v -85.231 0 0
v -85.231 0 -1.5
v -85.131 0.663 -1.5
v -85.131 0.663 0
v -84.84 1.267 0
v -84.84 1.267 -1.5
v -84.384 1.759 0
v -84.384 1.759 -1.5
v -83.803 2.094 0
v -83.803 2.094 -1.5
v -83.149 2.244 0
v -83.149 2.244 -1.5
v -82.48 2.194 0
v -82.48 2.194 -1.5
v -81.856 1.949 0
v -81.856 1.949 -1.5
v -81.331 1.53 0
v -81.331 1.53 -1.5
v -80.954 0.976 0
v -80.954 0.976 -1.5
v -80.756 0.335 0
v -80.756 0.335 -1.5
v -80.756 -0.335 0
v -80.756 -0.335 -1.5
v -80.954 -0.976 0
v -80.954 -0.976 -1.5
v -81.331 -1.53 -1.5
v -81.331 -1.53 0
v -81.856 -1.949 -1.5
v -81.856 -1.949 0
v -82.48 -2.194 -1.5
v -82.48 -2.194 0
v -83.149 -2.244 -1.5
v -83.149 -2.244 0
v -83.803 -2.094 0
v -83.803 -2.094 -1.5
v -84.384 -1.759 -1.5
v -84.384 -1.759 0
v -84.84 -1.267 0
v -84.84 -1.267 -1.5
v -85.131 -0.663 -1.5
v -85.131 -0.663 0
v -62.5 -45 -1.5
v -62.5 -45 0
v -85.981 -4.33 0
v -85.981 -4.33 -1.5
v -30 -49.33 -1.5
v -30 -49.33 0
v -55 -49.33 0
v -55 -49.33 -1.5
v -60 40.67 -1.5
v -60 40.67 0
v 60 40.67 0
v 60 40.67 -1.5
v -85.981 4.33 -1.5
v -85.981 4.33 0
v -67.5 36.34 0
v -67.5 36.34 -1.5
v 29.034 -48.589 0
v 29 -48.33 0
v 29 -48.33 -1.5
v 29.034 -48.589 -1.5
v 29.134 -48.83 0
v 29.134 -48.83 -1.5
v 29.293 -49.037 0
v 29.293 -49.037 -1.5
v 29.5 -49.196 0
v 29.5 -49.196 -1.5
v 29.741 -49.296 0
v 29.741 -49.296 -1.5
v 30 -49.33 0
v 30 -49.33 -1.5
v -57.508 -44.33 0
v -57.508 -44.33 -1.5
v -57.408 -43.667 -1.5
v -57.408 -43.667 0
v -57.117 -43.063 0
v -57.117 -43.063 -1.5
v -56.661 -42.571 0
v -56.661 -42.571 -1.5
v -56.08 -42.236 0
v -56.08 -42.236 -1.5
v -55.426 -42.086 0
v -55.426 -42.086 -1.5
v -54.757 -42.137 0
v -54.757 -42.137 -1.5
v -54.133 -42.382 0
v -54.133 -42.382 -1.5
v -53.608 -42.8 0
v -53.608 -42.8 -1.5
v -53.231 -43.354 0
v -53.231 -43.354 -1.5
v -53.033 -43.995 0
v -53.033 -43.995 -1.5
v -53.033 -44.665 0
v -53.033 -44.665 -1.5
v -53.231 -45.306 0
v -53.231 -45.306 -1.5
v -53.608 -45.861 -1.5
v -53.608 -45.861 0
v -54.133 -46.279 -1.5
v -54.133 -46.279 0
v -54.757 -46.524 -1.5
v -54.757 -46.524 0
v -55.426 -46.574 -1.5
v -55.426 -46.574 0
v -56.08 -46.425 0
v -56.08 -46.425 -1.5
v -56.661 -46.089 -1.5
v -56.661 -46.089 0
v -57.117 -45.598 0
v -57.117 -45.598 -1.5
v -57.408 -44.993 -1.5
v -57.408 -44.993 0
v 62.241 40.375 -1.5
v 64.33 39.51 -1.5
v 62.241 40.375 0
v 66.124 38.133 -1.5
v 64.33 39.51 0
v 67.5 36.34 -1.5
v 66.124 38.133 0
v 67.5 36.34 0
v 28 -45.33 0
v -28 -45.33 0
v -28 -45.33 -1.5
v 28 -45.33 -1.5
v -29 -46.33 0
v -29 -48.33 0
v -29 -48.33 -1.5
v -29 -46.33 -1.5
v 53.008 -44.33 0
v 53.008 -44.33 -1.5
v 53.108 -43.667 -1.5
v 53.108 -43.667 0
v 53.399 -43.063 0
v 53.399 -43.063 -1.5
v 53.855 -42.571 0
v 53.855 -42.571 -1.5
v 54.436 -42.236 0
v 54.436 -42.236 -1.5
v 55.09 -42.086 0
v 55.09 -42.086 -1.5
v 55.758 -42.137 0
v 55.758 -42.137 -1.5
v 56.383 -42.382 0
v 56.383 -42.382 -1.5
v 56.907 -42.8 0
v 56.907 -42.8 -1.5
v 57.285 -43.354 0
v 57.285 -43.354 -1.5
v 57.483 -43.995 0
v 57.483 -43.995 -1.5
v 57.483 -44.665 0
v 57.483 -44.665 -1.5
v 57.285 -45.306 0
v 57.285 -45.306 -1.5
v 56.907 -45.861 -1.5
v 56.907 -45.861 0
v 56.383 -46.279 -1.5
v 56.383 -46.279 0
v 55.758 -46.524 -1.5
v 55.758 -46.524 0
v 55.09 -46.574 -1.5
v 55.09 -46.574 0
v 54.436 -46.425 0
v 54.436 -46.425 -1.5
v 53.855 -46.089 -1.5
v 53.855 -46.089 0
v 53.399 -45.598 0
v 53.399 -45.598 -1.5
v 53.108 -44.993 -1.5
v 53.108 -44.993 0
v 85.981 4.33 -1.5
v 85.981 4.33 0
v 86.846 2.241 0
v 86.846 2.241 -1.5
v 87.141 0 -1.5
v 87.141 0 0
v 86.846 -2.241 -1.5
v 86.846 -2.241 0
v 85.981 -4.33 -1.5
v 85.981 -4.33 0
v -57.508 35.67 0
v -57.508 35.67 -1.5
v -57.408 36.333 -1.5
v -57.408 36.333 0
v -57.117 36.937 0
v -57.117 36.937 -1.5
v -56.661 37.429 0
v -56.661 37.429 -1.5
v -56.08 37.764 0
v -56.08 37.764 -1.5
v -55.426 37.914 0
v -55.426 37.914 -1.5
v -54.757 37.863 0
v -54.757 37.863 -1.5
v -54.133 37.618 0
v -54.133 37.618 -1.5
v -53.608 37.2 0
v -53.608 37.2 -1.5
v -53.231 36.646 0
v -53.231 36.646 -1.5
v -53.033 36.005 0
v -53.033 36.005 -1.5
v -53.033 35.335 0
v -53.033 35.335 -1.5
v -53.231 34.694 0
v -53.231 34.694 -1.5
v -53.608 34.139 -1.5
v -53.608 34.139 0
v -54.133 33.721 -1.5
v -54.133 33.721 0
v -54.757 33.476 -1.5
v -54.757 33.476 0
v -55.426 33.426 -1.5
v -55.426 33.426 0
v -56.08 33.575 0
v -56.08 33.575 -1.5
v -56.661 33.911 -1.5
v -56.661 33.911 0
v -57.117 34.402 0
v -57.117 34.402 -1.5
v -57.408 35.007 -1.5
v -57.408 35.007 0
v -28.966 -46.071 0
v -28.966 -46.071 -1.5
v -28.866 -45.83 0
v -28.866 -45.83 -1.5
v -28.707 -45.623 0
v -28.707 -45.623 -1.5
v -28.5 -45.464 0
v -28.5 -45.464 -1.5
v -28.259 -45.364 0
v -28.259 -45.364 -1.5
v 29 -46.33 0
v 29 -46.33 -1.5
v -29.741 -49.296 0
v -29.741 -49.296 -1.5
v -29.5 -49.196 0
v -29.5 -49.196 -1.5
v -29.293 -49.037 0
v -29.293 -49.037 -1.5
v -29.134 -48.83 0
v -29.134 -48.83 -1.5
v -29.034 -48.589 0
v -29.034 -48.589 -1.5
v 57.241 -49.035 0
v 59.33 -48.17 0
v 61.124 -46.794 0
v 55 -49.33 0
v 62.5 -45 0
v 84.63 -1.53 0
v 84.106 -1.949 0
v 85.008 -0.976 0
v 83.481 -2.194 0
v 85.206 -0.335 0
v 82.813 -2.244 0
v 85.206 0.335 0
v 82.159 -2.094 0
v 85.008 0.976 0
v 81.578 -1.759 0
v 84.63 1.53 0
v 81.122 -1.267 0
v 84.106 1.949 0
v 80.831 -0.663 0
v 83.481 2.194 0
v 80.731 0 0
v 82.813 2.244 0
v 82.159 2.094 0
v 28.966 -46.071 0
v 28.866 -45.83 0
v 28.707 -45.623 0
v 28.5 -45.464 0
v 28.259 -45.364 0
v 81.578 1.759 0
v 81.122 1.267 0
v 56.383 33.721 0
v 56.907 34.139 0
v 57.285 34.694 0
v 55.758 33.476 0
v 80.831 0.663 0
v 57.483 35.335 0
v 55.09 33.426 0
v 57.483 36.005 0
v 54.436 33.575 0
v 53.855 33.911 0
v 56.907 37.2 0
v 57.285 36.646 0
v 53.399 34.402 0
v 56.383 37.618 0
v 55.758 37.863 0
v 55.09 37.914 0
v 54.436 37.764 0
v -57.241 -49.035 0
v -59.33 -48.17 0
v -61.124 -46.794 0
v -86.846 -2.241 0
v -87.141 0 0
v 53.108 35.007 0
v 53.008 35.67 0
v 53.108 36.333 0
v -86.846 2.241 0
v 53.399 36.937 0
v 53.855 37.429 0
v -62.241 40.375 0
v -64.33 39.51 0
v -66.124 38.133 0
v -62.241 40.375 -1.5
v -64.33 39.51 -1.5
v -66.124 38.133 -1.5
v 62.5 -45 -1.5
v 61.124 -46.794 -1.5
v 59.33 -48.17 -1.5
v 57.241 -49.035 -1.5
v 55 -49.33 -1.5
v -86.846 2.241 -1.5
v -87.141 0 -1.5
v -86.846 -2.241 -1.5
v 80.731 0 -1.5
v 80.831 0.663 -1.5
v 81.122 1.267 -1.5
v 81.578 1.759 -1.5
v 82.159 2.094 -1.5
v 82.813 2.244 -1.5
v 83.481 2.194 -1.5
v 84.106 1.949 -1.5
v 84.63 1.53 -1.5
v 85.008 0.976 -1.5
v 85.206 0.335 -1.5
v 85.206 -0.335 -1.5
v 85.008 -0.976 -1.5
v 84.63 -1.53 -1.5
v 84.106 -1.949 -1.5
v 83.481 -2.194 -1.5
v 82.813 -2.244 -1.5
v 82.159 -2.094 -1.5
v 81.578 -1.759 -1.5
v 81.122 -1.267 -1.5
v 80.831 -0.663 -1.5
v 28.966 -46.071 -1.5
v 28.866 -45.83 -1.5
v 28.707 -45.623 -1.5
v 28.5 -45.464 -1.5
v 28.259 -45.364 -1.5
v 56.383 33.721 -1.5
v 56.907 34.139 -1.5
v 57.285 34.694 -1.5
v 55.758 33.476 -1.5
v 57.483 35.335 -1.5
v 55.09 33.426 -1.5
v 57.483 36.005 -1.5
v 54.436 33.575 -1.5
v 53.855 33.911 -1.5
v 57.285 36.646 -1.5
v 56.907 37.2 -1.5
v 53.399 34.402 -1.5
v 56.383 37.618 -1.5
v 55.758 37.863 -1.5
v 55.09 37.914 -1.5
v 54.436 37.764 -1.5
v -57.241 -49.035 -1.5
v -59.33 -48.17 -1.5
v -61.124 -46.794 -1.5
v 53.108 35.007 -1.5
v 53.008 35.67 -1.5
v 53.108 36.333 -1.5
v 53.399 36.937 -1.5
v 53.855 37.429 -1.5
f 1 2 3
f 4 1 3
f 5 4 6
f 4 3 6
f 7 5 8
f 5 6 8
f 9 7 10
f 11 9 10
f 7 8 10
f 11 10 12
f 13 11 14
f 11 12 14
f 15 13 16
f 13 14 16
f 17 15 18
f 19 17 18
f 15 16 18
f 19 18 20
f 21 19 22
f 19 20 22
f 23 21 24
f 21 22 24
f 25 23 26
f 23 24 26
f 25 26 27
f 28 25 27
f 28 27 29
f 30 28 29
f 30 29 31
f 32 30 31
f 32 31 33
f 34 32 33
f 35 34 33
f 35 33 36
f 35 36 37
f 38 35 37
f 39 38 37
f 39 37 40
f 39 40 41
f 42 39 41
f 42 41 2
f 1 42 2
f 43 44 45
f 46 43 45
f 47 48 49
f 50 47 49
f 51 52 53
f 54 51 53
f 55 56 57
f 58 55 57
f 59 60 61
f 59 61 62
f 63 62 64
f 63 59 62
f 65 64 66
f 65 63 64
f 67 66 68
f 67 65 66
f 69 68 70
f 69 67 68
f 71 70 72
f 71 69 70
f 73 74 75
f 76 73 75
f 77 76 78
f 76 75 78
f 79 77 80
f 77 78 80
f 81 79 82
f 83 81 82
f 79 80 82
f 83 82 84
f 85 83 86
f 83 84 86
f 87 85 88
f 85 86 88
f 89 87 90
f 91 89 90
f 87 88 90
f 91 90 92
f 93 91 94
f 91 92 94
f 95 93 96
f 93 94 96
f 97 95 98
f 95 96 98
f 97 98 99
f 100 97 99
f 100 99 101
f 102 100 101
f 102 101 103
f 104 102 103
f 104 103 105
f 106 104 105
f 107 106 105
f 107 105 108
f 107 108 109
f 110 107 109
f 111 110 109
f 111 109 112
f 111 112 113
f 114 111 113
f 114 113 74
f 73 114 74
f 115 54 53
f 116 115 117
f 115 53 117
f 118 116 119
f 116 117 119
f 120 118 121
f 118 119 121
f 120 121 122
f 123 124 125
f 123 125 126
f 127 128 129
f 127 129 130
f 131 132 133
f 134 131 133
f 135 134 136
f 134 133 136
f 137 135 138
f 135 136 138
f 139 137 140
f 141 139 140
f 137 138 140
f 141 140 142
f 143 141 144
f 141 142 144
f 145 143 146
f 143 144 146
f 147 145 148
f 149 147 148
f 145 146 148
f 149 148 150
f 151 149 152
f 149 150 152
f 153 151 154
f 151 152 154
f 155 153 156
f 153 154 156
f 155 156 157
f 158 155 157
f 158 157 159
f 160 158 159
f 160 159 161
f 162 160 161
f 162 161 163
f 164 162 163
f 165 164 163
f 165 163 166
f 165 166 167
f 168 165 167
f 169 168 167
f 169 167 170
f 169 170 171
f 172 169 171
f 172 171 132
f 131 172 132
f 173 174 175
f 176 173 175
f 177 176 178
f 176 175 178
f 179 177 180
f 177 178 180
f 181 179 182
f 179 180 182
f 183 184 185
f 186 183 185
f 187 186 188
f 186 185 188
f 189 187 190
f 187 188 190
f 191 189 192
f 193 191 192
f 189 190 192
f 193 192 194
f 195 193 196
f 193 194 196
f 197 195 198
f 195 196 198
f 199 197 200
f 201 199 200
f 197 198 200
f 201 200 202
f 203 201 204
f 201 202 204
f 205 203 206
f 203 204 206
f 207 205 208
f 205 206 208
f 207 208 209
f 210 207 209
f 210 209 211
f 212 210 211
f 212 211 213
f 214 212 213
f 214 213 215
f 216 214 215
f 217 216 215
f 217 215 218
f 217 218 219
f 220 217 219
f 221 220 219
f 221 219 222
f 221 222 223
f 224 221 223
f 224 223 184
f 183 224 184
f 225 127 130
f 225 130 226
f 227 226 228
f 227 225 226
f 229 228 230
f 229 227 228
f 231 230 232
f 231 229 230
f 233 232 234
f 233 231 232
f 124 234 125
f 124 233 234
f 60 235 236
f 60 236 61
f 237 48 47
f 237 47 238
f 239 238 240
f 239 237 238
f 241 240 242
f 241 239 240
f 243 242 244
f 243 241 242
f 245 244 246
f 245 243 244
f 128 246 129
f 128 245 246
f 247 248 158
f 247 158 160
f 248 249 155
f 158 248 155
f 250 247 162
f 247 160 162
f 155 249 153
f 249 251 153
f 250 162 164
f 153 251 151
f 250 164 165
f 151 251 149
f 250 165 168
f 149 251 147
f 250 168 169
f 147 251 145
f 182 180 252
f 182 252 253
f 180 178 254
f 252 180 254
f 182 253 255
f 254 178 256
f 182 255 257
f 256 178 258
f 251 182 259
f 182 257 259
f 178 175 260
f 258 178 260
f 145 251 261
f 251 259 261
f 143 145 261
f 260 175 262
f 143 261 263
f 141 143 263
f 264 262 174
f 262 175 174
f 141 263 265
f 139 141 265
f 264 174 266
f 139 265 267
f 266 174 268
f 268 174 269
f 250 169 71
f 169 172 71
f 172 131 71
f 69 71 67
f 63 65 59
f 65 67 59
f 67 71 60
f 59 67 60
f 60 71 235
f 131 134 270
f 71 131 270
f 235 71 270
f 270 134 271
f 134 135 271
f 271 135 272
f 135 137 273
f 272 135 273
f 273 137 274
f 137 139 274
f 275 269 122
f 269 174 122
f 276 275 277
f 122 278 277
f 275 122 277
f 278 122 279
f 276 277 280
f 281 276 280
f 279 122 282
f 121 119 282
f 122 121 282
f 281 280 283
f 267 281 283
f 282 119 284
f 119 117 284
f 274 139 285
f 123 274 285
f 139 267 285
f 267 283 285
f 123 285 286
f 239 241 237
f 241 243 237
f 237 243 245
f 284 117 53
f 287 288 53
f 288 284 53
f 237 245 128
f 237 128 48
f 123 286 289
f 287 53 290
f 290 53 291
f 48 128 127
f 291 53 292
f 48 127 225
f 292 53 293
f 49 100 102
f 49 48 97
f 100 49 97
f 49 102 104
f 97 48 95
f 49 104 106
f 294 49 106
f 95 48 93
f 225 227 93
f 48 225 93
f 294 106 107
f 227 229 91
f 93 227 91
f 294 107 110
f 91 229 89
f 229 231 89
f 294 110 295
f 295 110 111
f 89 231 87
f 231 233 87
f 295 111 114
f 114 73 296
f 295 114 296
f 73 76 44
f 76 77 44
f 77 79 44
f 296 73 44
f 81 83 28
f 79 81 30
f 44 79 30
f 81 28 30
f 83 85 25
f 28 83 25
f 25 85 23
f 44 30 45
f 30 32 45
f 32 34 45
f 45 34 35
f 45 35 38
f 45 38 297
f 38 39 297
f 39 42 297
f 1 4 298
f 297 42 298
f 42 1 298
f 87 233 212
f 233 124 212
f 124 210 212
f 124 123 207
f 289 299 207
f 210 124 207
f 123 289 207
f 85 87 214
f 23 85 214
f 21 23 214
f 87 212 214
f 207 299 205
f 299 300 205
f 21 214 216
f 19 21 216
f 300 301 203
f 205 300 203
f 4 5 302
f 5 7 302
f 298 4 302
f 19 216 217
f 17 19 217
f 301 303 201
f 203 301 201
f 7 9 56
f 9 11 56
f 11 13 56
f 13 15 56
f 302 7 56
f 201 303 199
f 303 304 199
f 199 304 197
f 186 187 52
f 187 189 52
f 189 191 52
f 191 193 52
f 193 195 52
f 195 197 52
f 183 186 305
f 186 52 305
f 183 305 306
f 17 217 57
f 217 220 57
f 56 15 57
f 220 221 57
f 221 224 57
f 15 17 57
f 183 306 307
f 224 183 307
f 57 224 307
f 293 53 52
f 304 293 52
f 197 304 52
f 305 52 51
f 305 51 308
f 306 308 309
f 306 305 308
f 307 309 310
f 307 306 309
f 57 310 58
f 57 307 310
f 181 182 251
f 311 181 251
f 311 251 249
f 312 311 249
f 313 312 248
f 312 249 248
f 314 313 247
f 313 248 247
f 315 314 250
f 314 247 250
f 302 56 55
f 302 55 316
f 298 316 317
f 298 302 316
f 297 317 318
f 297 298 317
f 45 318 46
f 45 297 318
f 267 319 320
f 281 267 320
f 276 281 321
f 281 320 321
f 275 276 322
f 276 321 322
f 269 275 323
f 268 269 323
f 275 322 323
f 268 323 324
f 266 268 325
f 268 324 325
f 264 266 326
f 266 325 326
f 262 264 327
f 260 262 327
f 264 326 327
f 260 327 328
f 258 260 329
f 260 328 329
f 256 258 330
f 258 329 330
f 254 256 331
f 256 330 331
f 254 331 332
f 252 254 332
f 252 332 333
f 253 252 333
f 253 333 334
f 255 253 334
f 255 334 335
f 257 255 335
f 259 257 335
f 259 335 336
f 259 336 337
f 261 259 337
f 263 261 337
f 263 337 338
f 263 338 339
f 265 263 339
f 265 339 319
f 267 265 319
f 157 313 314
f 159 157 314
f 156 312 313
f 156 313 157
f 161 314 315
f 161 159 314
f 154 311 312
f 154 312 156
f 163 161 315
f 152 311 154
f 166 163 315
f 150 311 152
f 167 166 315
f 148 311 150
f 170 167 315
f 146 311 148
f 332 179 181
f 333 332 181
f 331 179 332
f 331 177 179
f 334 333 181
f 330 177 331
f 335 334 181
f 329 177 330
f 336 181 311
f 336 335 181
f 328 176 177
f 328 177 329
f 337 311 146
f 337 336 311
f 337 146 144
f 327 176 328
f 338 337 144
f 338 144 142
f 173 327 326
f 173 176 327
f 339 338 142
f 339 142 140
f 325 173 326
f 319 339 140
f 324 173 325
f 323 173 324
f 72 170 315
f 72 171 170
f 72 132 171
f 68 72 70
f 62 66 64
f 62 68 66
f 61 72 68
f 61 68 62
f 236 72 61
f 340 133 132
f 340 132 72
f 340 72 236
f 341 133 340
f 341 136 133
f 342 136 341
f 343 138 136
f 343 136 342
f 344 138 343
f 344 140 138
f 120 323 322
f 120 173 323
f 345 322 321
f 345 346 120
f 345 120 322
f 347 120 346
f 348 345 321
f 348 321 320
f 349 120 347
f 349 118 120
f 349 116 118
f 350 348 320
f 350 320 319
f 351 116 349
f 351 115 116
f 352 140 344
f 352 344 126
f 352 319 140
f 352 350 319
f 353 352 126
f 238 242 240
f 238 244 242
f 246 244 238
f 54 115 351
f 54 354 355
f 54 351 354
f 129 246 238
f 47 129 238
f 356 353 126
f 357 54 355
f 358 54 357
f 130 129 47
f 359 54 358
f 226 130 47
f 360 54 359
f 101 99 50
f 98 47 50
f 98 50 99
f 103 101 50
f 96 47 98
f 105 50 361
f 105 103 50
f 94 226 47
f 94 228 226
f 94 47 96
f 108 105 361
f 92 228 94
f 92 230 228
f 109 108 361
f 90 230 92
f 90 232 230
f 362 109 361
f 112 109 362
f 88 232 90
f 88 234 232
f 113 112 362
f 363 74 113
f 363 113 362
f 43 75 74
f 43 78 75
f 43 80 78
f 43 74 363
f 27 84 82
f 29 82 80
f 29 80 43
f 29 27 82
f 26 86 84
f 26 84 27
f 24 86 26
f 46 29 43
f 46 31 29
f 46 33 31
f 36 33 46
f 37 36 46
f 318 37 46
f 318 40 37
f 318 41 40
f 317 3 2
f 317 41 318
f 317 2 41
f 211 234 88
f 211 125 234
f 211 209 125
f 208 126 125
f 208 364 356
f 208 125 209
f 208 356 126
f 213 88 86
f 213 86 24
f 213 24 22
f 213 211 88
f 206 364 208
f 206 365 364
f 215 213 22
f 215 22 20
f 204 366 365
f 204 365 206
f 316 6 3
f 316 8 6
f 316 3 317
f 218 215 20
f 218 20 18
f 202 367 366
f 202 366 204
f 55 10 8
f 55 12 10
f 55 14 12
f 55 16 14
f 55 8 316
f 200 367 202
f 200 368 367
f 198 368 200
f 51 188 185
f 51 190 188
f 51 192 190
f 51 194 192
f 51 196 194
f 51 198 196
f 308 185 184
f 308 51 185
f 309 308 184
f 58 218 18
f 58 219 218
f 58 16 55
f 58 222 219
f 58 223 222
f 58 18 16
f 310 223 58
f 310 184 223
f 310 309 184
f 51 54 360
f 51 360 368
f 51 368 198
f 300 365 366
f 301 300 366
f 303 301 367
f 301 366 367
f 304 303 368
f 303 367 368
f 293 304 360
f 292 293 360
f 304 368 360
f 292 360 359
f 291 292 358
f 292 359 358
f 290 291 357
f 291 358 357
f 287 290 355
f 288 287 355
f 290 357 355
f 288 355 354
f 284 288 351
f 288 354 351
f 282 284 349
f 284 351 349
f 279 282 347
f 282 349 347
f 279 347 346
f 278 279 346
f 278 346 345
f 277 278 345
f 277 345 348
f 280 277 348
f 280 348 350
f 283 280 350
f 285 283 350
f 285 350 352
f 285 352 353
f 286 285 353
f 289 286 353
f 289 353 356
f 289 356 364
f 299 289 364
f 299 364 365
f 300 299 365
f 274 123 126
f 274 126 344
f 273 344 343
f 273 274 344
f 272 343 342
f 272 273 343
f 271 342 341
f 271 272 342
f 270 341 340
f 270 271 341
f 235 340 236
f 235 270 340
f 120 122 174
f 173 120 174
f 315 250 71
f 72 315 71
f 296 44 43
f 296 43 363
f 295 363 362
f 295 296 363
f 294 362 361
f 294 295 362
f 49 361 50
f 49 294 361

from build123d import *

# Parameters (mm, degrees)
FLANGE_BASE1_DEPTH    = 1.5
ESBO_O7_R             = 2.25
CORTE_EXTRUS_O1_DEPTH = 10
CORTE_EXTRUS_O3_DEPTH = 10
CORTE_EXTRUS_O4_DEPTH = 10


# Sheet-metal steps are written as plain solids
with BuildPart() as part:
    # Esboço2 → Flange-base1 (new body)
    with BuildSketch(Plane.XY):
        Polygon((60, -49.330127019), (-60, -49.330127019), (-88.480762114, 0), (-65, 40.669872981), (65, 40.669872981), (88.480762114, 0), align=None)
    extrude(amount=-FLANGE_BASE1_DEPTH)

    # Esboço7 → Corte-extrusão1 (cut)
    with BuildSketch(Plane(origin=(0, 0, -1.5), x_dir=(-1, 0, 0), z_dir=(0, 0, -1))):
        with Locations((-82.980762114, 0)):
            Circle(ESBO_O7_R)
        with Locations((-55.257737945, -44.330127019)):
            Circle(ESBO_O7_R)
        with Locations((55.257737945, -44.330127019)):
            Circle(ESBO_O7_R)
        with Locations((82.980762114, 0)):
            Circle(ESBO_O7_R)
        with Locations((55.257737945, 35.669872981)):
            Circle(ESBO_O7_R)
        with Locations((-55.257737945, 35.669872981)):
            Circle(ESBO_O7_R)
    extrude(amount=-CORTE_EXTRUS_O1_DEPTH, mode=Mode.SUBTRACT)

    # Esboço8 → Corte-extrusão3 (cut)
    with BuildSketch(Plane.XY):
        with BuildLine():
            Line((-85.980762114, -4.330127019), (-62.5, -45))
            ThreePointArc((-62.5, -45), (-59.330127019, -48.169872981), (-55, -49.330127019))
            Line((-55, -49.330127019), (-88.480762114, -49.330127019))
            Line((-88.480762114, -49.330127019), (-88.480762114, 40.669872981))
            Line((-88.480762114, 40.669872981), (-60, 40.669872981))
            ThreePointArc((-60, 40.669872981), (-64.330127019, 39.509618943), (-67.5, 36.339745962))
            Line((-67.5, 36.339745962), (-85.980762114, 4.330127019))
            ThreePointArc((-85.980762114, 4.330127019), (-87.141016151, 0), (-85.980762114, -4.330127019))
        make_face()
    corte_extrus_o3 = extrude(amount=-CORTE_EXTRUS_O3_DEPTH, mode=Mode.SUBTRACT)

    # Espelhar1: Corte-extrusão3 across plane
    add(corte_extrus_o3.mirror(Plane(origin=(0, 0, 0), x_dir=(0, 0, 1), z_dir=(1, 0, 0))), mode=Mode.SUBTRACT)

    # Esboço9 → Corte-extrusão4 (cut)
    with BuildSketch(Plane.XY):
        with BuildLine():
            Line((-29, -48.330127019), (-29, -46.330127019))
            ThreePointArc((-29, -46.330127019), (-28.707106781, -45.623020238), (-28, -45.330127019))
            Line((-28, -45.330127019), (28, -45.330127019))
            ThreePointArc((28, -45.330127019), (28.707106781, -45.623020238), (29, -46.330127019))
            Line((29, -46.330127019), (29, -48.330127019))
            ThreePointArc((29, -48.330127019), (29.292893219, -49.0372338), (30, -49.330127019))
            Line((30, -49.330127019), (-30, -49.330127019))
            ThreePointArc((-30, -49.330127019), (-29.292893219, -49.0372338), (-29, -48.330127019))
        make_face()
    extrude(amount=-CORTE_EXTRUS_O4_DEPTH, mode=Mode.SUBTRACT)


solid = part.part
